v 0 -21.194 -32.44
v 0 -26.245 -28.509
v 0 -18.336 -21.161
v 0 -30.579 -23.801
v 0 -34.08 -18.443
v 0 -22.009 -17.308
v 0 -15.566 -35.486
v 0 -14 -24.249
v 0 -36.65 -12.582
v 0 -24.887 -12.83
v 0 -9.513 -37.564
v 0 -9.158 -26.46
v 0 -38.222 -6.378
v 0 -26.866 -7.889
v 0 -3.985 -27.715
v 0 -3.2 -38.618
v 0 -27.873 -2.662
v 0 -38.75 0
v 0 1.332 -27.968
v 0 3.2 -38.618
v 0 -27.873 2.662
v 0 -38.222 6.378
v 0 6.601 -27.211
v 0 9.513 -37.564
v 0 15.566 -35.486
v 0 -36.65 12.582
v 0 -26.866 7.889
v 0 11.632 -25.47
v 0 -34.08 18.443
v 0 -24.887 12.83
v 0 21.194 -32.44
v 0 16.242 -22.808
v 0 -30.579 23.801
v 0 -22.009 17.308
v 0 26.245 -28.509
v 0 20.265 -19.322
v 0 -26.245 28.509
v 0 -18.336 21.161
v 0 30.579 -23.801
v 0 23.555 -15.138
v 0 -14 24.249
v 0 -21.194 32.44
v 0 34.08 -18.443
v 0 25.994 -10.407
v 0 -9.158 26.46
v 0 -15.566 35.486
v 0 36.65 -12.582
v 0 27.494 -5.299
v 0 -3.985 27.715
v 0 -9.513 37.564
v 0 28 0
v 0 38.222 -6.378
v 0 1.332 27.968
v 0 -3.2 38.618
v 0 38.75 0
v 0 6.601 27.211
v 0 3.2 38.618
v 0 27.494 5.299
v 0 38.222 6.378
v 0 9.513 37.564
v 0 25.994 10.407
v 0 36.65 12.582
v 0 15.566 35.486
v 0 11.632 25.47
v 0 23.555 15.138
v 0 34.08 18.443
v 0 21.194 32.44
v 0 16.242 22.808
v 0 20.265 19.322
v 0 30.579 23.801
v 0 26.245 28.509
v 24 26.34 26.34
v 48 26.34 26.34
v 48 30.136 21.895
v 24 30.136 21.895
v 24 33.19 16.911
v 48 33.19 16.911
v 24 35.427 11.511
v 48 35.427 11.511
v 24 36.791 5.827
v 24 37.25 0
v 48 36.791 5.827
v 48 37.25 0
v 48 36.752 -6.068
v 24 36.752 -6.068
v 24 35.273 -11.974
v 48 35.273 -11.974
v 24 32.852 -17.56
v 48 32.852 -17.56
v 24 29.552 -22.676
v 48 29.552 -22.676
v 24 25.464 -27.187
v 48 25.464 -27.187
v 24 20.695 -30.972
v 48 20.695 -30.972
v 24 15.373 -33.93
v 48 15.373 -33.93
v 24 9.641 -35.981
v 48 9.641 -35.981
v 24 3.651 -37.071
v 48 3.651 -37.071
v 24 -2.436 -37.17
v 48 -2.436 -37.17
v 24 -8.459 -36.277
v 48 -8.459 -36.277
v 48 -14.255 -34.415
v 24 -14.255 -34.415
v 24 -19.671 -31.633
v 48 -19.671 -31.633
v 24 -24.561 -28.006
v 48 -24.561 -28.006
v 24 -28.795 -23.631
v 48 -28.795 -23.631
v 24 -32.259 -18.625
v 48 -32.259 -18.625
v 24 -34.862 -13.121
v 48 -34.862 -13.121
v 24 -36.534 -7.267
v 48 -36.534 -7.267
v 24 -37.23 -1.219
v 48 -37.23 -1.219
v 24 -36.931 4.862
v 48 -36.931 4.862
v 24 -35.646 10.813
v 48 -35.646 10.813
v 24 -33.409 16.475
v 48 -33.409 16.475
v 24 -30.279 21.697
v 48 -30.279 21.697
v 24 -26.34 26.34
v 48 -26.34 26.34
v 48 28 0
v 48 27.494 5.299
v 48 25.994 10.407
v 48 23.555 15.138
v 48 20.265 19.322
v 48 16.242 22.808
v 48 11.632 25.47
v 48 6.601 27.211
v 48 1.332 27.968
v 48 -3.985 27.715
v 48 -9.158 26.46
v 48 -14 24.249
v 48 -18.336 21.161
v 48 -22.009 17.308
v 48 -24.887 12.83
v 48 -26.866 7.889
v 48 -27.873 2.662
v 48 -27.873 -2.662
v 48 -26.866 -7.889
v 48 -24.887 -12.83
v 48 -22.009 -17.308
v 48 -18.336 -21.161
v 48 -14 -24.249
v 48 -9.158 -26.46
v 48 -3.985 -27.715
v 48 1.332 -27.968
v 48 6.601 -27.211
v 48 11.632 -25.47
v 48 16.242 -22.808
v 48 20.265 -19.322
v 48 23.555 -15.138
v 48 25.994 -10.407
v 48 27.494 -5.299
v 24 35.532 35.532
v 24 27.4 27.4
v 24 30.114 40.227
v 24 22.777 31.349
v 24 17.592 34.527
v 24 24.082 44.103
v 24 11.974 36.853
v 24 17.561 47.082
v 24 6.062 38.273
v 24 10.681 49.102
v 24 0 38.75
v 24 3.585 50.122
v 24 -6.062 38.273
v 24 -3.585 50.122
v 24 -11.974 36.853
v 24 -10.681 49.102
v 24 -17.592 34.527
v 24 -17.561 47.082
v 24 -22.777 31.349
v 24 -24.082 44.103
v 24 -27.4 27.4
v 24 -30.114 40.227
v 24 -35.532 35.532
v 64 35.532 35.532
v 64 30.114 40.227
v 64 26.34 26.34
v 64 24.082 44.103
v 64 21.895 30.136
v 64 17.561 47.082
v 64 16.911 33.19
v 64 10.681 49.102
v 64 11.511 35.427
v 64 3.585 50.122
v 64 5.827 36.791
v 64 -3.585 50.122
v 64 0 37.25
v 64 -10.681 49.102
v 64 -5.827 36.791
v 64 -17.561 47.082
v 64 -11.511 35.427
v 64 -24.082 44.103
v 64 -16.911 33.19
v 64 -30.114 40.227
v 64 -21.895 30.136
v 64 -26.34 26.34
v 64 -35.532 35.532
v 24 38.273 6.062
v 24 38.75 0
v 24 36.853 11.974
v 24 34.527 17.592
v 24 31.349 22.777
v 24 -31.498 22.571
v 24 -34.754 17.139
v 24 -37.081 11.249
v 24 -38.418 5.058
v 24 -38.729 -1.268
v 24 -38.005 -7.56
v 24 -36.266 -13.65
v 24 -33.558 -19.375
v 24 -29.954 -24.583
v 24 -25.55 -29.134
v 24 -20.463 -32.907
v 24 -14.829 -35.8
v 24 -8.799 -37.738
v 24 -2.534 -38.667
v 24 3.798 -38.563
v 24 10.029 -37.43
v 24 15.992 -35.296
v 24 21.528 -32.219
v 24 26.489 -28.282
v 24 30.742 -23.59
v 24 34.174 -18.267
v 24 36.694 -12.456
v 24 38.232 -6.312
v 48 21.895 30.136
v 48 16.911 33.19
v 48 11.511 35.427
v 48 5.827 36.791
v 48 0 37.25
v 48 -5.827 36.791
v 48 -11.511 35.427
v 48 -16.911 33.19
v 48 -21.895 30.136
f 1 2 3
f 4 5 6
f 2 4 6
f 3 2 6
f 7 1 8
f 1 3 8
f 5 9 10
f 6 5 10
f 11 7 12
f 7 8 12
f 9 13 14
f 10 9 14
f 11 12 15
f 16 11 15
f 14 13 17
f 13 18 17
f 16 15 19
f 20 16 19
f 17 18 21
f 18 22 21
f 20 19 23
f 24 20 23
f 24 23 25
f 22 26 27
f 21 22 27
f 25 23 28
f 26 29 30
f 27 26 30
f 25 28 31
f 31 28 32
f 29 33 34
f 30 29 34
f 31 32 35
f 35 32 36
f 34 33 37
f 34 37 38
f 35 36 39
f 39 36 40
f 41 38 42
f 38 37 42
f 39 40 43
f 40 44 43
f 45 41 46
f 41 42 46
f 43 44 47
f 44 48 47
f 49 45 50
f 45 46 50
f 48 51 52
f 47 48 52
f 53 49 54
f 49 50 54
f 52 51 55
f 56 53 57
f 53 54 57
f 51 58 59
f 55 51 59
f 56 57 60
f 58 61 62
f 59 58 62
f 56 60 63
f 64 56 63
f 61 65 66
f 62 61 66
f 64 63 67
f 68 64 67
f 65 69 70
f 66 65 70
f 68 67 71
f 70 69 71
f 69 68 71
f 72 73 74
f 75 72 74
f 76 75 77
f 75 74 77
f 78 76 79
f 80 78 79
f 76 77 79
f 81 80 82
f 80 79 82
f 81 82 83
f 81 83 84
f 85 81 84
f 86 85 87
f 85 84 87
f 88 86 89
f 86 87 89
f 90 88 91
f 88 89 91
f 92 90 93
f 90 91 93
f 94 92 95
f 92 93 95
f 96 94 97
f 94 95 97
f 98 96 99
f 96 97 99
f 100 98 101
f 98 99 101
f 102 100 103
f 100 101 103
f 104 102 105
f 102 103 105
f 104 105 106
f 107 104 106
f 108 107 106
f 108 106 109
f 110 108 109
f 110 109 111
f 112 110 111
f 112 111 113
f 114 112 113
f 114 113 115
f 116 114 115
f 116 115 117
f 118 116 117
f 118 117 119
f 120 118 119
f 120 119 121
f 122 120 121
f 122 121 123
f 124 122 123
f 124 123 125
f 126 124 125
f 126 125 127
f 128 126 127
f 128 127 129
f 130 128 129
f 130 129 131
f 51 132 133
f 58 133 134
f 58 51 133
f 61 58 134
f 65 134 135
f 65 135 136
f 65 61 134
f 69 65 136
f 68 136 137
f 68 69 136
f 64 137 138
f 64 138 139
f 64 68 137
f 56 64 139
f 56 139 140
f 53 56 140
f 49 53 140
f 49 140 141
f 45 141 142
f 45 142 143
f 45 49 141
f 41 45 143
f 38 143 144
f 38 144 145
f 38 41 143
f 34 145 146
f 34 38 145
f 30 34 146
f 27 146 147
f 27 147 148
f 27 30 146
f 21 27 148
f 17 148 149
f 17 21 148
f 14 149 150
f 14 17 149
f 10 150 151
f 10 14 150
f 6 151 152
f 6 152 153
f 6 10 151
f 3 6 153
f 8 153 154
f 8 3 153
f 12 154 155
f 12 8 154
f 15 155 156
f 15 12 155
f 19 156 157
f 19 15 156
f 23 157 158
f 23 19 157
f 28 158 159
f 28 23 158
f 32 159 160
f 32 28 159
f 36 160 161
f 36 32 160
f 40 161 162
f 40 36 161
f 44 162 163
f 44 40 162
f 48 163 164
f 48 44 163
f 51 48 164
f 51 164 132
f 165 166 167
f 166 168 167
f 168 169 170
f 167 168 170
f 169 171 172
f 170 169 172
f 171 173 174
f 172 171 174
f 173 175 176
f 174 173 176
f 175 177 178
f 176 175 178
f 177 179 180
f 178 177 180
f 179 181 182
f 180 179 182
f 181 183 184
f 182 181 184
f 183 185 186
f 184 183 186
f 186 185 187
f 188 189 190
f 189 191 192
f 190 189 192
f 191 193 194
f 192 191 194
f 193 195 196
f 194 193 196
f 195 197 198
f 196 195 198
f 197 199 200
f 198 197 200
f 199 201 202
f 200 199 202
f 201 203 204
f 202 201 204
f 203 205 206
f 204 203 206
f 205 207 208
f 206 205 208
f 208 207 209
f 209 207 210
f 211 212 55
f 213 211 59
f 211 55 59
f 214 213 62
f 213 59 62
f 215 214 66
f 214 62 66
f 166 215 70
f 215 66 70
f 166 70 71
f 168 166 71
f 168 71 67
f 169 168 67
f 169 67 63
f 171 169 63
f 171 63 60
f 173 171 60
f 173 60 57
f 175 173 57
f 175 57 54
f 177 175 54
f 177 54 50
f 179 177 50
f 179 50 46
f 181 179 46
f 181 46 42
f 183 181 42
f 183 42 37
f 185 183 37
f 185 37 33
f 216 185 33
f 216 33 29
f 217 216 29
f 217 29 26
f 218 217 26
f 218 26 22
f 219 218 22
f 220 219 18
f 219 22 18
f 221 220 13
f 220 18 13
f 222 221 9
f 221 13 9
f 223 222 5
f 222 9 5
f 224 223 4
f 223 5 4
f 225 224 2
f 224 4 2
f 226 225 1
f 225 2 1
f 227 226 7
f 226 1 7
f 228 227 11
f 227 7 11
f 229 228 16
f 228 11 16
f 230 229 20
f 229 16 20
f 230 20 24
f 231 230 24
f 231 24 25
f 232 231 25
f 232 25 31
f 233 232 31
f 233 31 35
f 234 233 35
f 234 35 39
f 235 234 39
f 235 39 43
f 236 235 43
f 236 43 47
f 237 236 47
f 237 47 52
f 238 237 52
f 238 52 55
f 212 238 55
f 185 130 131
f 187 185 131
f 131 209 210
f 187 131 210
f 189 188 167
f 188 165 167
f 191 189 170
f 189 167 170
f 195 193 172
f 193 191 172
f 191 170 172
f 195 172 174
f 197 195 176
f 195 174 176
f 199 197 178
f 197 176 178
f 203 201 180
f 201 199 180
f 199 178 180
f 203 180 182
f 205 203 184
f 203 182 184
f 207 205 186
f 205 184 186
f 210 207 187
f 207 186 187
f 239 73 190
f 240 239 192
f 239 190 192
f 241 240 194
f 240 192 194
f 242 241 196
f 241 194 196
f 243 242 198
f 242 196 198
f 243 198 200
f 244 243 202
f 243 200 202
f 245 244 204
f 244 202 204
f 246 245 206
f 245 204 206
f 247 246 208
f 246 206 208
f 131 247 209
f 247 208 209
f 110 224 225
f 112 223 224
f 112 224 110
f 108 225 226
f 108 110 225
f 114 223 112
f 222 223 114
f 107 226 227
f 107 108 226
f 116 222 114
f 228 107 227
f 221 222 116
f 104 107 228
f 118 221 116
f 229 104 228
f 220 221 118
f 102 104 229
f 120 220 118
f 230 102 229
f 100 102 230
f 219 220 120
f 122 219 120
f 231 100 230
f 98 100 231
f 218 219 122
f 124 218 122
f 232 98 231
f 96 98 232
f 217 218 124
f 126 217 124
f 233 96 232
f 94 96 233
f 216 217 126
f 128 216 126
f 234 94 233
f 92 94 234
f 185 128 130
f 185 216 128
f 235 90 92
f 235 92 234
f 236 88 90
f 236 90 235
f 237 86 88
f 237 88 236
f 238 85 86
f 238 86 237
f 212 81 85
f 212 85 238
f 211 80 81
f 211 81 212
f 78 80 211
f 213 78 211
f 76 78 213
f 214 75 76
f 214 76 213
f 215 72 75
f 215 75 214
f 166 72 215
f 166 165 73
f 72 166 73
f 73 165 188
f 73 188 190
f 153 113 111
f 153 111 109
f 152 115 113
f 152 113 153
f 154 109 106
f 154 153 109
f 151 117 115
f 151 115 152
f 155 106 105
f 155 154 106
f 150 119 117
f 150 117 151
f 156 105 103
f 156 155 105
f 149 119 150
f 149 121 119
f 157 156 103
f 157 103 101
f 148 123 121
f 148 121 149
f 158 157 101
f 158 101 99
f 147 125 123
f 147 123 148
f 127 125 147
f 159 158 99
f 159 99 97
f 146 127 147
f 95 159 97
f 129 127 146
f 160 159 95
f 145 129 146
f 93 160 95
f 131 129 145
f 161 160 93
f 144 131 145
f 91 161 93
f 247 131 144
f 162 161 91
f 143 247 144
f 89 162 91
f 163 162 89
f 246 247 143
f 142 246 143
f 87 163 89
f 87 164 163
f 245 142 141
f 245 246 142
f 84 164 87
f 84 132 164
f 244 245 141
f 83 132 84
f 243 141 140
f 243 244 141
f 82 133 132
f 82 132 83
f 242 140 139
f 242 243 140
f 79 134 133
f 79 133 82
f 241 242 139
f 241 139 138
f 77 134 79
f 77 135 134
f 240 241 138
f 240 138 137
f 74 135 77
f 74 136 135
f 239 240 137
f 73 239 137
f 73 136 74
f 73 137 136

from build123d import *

# Parameters (mm, degrees)
F0_R     = 38.75
F0_R_2   = 28
F1_DEPTH = 48
F5_DEPTH = 40


with BuildPart() as f1:
    # F0 (on Right) → F1 (new body)
    with BuildSketch(Plane.YZ):
        Circle(F0_R)
        Circle(F0_R_2, mode=Mode.SUBTRACT)
    extrude(amount=F1_DEPTH)

    # F2 (on Front) → F3 (revolve)
    with BuildSketch(Plane.XZ):
        Polygon((24, 50.25), (24, 38.75), (48, 38.75), (48, 37.25), (64, 37.25), (64, 50.25), align=None)
    revolve(axis=Axis((48, 0, 0), (1, 0, 0)))

    # F4 (on face) → F5 (cut)
    with BuildSketch(Plane.YZ.offset(64)):
        with BuildLine():
            ThreePointArc((37.25, 0), (-14.2549578556, -34.414512586), (-26.3397275992, 26.3397275992))
            Line((-26.3397275992, 26.3397275992), (-35.5321157546, 35.5321157546))
            ThreePointArc((-35.5321157546, 35.5321157546), (-19.2298424763, -46.4249465087), (50.25, 0))
            ThreePointArc((50.25, 0), (46.4249465087, 19.2298424763), (35.5321157546, 35.5321157546))
            Line((35.5321157546, 35.5321157546), (26.3397275992, 26.3397275992))
            ThreePointArc((26.3397275992, 26.3397275992), (34.414512586, 14.2549578556), (37.25, 0))
        make_face()
    extrude(amount=-F5_DEPTH, mode=Mode.SUBTRACT)


solid = f1.part
